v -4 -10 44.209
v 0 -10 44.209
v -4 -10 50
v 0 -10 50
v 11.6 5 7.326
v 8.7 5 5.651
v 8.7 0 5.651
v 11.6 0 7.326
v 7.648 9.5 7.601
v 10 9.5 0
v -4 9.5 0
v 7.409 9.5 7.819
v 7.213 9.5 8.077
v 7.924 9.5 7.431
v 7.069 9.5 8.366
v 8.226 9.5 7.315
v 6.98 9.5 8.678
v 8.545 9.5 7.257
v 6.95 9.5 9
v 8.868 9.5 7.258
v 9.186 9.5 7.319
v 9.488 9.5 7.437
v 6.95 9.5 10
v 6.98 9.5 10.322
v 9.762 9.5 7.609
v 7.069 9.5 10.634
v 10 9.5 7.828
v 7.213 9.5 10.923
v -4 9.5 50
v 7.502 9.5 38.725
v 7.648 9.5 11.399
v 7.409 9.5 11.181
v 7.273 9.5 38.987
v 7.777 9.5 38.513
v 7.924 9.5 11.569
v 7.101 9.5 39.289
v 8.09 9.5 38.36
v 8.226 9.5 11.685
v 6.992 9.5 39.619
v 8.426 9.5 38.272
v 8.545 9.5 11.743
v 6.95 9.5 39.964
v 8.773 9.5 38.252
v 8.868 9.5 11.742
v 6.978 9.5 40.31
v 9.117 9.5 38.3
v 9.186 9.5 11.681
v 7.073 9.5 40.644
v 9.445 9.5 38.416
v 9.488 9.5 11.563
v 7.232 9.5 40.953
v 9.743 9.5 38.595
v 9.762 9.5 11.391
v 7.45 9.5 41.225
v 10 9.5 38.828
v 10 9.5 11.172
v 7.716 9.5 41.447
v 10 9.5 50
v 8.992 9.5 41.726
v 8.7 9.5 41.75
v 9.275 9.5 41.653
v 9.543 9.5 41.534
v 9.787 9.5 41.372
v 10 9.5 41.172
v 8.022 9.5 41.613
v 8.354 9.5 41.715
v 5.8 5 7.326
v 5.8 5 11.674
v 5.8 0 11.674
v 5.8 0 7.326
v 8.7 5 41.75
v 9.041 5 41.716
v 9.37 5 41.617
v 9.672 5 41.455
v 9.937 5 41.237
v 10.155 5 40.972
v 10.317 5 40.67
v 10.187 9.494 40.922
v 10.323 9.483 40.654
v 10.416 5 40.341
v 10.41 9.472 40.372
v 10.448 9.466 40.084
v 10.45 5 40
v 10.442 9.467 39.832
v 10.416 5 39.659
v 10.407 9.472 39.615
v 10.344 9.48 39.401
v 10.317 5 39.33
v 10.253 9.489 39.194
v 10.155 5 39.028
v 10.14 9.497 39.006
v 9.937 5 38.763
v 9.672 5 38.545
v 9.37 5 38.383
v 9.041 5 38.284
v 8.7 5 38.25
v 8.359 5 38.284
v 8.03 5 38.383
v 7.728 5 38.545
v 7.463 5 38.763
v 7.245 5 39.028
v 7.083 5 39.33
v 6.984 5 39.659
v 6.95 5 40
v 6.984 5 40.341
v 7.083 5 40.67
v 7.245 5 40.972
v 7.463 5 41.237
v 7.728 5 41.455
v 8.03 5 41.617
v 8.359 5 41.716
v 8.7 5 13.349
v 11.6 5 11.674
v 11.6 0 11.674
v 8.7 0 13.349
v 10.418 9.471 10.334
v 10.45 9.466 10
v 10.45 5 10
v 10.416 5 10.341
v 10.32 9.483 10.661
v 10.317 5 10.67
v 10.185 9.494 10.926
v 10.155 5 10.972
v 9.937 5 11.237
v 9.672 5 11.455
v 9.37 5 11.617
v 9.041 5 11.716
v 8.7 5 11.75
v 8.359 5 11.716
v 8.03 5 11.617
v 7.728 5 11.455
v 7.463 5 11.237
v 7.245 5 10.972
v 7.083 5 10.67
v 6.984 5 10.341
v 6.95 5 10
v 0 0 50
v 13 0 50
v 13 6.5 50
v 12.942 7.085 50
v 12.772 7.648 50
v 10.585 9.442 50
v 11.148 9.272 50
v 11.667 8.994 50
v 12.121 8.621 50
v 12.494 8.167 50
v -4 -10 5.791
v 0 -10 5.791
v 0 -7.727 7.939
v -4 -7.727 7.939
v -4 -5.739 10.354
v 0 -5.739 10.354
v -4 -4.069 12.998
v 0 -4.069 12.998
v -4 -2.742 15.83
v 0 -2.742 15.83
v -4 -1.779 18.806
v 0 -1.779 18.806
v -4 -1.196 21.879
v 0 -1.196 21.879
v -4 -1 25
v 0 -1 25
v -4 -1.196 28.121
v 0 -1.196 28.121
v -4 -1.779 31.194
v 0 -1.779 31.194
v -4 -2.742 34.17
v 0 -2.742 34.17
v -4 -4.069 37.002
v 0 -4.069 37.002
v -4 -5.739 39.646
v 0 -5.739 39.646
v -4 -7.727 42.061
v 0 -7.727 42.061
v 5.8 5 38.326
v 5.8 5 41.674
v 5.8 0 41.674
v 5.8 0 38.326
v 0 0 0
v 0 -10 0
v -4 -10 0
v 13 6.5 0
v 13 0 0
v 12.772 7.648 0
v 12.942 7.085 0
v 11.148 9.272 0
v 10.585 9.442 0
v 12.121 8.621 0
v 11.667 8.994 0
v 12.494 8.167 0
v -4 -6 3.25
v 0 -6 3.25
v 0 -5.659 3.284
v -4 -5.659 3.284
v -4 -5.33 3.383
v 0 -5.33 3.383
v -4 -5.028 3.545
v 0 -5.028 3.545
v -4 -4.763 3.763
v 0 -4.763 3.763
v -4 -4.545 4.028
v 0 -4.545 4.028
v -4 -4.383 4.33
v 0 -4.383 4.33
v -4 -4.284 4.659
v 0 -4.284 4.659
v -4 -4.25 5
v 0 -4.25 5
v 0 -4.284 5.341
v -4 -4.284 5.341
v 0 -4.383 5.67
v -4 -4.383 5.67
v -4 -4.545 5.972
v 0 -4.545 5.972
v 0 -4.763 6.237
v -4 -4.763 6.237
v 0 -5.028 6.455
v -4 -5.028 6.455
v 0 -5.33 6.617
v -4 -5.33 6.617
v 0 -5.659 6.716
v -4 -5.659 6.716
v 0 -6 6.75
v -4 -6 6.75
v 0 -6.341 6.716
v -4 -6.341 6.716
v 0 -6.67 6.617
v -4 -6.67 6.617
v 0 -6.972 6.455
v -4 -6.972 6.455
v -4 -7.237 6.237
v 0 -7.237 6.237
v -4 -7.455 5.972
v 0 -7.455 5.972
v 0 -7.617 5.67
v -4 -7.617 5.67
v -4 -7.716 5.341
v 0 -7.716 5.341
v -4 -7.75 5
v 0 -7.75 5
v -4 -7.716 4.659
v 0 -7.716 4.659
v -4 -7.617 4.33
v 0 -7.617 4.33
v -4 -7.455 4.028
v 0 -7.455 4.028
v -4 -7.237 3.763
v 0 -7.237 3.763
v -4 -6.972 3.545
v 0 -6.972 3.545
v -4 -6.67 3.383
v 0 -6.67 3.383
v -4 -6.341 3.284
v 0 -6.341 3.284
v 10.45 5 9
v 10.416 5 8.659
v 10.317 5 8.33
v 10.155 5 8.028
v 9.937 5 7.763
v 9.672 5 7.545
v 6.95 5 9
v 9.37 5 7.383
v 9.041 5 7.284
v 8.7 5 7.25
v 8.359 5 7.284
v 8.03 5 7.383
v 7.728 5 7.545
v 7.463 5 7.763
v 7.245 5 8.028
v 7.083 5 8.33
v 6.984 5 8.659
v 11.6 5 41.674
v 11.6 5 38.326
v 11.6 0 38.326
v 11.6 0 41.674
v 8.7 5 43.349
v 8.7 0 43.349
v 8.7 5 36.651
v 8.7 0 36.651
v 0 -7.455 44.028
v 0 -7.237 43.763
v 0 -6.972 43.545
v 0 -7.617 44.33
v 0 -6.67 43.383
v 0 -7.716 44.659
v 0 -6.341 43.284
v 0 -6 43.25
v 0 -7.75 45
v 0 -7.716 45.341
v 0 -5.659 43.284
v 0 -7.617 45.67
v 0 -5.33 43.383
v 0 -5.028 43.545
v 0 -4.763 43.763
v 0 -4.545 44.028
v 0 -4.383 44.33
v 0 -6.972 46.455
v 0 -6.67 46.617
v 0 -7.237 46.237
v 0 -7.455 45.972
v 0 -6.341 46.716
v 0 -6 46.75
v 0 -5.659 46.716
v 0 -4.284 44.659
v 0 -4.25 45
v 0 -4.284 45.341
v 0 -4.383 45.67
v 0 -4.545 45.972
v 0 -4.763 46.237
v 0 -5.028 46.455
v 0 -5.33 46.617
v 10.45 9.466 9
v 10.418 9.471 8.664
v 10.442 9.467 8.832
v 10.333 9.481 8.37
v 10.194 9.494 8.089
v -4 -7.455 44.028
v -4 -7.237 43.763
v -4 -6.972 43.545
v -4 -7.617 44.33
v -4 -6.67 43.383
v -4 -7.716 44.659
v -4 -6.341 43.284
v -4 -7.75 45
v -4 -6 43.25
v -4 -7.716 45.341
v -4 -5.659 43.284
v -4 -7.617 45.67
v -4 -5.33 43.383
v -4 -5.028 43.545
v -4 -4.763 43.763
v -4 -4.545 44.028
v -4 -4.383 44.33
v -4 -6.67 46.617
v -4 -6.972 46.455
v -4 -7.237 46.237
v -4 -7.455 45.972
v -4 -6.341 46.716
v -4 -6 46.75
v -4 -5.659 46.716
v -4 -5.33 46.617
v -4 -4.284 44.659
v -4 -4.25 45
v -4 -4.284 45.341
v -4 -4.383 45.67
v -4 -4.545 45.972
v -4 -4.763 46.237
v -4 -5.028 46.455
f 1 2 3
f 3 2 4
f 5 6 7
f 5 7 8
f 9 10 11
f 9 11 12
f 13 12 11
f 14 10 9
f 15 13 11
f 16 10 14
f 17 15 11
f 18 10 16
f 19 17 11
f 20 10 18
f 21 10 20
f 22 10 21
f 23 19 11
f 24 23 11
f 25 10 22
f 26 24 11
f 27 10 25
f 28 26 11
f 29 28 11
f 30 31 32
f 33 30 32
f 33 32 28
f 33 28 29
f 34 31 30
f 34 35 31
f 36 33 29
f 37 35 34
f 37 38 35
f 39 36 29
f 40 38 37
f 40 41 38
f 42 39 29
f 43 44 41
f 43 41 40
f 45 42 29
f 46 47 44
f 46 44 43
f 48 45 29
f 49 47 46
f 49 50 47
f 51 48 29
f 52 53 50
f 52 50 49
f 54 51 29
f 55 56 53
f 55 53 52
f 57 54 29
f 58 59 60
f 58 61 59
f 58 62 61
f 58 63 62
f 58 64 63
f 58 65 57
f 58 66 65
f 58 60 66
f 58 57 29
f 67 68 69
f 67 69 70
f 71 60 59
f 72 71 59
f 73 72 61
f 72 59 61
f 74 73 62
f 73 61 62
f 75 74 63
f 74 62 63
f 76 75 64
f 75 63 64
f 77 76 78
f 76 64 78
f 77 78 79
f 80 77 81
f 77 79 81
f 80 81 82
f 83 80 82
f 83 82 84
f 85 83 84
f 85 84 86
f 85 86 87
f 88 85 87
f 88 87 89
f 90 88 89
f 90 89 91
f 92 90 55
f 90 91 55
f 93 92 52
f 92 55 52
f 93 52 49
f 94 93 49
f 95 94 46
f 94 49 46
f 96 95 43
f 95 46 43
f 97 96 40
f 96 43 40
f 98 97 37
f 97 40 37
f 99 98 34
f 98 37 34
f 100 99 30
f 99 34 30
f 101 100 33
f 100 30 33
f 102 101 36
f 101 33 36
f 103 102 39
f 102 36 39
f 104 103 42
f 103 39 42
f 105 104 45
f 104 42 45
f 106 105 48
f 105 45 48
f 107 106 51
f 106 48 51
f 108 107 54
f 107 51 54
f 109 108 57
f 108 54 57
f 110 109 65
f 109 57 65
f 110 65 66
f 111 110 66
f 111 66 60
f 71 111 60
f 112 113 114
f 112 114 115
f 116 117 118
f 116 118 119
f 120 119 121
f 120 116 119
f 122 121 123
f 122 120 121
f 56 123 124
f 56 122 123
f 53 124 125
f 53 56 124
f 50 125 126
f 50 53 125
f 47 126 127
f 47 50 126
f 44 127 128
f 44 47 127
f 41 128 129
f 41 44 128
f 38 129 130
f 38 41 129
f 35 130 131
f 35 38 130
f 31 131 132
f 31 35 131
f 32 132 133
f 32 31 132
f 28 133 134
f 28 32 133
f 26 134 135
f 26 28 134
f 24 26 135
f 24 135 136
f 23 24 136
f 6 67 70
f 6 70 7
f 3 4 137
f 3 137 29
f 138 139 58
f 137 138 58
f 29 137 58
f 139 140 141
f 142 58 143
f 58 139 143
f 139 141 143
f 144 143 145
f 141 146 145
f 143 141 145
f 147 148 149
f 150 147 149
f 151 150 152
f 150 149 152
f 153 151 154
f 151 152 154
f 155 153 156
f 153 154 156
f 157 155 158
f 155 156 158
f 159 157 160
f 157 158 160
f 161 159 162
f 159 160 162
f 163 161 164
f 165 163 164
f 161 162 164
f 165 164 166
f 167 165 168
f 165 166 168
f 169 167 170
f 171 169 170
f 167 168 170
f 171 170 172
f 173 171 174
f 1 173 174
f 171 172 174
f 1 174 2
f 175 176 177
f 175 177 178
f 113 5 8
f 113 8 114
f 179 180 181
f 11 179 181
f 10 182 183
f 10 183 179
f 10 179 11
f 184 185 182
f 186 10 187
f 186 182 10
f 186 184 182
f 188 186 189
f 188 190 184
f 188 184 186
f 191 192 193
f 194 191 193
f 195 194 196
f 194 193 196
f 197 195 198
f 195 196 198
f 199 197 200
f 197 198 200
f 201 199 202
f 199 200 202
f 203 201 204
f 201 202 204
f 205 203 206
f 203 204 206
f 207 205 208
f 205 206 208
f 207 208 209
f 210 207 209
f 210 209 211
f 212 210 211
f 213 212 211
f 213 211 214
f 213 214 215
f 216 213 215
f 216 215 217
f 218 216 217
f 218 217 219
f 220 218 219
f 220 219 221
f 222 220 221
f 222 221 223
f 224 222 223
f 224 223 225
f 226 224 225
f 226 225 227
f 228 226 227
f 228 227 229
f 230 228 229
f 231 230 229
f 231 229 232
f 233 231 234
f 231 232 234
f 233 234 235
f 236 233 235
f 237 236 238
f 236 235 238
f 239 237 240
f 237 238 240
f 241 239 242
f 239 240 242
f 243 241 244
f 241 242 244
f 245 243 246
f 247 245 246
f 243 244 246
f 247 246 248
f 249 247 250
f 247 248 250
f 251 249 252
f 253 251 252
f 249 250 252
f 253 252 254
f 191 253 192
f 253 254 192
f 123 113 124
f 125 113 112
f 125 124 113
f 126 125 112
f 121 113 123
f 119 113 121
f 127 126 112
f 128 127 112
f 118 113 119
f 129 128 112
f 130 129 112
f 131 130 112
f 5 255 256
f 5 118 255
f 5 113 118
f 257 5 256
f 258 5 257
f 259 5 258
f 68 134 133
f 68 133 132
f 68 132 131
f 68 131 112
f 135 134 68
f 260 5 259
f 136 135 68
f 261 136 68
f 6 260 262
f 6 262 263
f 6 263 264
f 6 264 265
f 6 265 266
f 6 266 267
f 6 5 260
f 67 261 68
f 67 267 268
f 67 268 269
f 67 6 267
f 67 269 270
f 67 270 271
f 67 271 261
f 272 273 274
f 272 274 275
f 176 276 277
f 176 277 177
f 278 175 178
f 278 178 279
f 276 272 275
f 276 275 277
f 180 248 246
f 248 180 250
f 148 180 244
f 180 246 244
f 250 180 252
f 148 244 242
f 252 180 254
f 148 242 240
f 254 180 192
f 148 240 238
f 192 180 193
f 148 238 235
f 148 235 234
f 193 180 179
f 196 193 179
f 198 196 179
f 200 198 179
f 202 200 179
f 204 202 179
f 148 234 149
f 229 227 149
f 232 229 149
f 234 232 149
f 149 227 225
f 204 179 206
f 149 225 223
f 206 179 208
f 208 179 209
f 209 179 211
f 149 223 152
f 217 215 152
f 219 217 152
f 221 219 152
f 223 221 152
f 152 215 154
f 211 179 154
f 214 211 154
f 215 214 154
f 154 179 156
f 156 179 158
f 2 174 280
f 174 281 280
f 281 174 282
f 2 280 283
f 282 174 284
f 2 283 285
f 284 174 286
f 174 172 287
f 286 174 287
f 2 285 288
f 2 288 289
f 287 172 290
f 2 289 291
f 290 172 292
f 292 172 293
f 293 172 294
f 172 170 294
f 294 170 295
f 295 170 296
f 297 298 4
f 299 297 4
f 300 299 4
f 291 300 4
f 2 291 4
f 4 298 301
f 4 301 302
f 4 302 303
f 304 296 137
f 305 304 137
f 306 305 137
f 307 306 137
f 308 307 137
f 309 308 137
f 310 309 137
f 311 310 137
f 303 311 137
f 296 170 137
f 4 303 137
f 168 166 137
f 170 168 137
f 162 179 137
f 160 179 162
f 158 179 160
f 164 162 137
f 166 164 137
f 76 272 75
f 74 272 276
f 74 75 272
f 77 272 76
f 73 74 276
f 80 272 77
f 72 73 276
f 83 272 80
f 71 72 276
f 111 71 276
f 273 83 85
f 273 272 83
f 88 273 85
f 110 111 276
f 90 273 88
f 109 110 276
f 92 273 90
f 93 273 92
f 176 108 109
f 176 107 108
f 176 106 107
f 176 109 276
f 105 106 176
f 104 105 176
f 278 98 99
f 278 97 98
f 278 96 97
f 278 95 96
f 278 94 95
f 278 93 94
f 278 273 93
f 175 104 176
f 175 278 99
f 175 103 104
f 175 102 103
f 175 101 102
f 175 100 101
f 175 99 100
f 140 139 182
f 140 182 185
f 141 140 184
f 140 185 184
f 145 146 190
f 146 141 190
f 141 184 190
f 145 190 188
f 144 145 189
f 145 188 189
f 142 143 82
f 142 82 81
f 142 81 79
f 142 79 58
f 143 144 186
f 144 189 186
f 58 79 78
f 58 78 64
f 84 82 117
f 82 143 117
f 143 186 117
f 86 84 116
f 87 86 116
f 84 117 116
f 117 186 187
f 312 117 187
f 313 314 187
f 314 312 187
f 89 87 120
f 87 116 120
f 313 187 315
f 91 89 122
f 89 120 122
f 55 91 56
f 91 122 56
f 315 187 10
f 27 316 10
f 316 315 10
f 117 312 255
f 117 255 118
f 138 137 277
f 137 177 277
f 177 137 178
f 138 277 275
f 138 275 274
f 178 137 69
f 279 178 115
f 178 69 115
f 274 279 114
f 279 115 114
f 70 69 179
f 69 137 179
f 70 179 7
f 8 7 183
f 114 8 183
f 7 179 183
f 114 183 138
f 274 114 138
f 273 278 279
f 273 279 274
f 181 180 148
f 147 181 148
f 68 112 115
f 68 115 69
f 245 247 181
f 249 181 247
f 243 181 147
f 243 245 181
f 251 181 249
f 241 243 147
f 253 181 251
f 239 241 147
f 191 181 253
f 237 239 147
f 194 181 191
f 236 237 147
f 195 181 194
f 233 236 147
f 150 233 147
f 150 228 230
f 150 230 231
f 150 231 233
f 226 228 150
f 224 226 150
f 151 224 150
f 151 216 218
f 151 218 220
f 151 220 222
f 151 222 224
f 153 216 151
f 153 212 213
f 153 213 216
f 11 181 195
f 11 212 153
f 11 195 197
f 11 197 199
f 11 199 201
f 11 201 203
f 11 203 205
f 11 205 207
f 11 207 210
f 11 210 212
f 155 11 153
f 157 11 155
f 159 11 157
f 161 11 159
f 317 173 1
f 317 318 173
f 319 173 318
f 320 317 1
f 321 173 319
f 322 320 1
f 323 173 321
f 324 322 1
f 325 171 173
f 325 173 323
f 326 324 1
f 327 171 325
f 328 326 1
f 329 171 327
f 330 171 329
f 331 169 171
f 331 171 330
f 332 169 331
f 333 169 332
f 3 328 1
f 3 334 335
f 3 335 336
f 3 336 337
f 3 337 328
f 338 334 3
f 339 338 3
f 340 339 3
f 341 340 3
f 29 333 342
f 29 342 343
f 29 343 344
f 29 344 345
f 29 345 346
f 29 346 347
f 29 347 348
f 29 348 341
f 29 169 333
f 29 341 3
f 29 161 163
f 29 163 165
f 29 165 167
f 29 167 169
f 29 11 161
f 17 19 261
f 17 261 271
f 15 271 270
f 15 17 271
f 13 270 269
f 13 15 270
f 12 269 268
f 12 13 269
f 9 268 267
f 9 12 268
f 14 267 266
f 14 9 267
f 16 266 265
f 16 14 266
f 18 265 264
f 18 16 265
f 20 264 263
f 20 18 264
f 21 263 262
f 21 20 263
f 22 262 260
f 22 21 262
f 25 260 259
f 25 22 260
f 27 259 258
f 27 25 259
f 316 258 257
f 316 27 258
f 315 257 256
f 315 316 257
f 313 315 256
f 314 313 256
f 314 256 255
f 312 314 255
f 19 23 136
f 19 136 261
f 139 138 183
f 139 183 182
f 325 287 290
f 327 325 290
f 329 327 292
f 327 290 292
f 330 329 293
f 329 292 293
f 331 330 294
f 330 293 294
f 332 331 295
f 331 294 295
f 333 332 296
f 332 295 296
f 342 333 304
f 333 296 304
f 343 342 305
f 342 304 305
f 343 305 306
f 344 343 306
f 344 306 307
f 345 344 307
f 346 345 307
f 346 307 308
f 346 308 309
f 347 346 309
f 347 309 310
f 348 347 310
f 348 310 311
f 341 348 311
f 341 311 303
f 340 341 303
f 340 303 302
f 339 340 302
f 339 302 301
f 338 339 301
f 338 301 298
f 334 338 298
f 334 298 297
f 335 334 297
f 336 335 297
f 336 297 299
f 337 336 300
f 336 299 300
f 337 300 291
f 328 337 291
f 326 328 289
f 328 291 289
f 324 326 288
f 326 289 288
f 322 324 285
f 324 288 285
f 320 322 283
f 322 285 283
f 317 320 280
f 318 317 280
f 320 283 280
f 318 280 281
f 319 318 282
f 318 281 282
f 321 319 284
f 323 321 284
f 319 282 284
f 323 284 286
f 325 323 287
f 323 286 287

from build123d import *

# Parameters (mm, degrees)
ESQUISSE1_W             = 13
ESQUISSE1_H             = 9.5
BOSS_EXTRU_1_DEPTH      = 50
ESQUISSE2_R             = 1.75
ENL_V_MAT_EXTRU_1_DEPTH = 500
ESQUISSE3_W             = 50
ESQUISSE3_H             = 61.5
BOSS_EXTRU_2_DEPTH      = 4
ESQUISSE4_R             = 1.75
ENL_V_MAT_EXTRU_2_DEPTH = 33.5
CONG_2_R                = 3
ENL_V_START             = -5
ESQUISSE5_R             = 1.75
ENL_V_MAT_EXTRU_3_DEPTH = 5


with BuildPart() as part:
    # Esquisse1 → Boss.-Extru.1 (new body)
    with BuildSketch(Plane.XY):
        with Locations((6.5, 4.75)):
            Rectangle(ESQUISSE1_W, ESQUISSE1_H)
    extrude(amount=BOSS_EXTRU_1_DEPTH)

    # Esquisse2 → Enlèv. mat.-Extru.1 (cut)
    with BuildSketch(Plane(origin=(0, 9.5, 0), x_dir=(1, 0, 0), z_dir=(0, 1, 0))):
        with Locations(Location((8.7, -40, 0), (0, 0, 270))):
            Circle(ESQUISSE2_R)
        with BuildLine():
            Line((6.95, -10), (6.95, -9))
            ThreePointArc((6.95, -9), (8.7, -7.25), (10.45, -9))
            Line((10.45, -9), (10.45, -10))
            ThreePointArc((10.45, -10), (8.7, -11.75), (6.95, -10))
        make_face()
    extrude(amount=-ENL_V_MAT_EXTRU_1_DEPTH, mode=Mode.SUBTRACT)

    # Esquisse3 → Boss.-Extru.2 (add)
    with BuildSketch(Plane.ZY):
        with Locations((25, -21.25)):
            Rectangle(ESQUISSE3_W, ESQUISSE3_H)
    extrude(amount=BOSS_EXTRU_2_DEPTH)

    # Esquisse4 → Enlèv. mat.-Extru.2 (cut)
    with BuildSketch(Plane(origin=(0, 0, 0), x_dir=(0, 0, -1), z_dir=(1, 0, 0))):
        with BuildLine():
            Line((-44.209372712, -10), (-50, -10))
            Line((-50, -10), (-50, -52))
            Line((-50, -52), (0, -52))
            Line((0, -52), (0, -10))
            Line((0, -10), (-5.790627288, -10))
            ThreePointArc((-5.790627288, -10), (-25, -1), (-44.209372712, -10))
        make_face()
        with Locations((-45, -6)):
            Circle(ESQUISSE4_R)
        with Locations((-5, -6)):
            Circle(ESQUISSE4_R)
    extrude(amount=-ENL_V_MAT_EXTRU_2_DEPTH, mode=Mode.SUBTRACT)

    # Congé2
    # the kernel refuses this fillet: 3 mm, written as the material it takes off along each edge
    with BuildSketch(Plane(origin=(13, 9.5, -7.5), x_dir=(0, -1, 0), z_dir=(0, 0, 1))) as cong_2_piece_1:
        with BuildLine():
            CenterArc((CONG_2_R, -CONG_2_R), CONG_2_R, 90, 90)
            Line((0, -CONG_2_R), (0, 0))
            Line((0, 0), (CONG_2_R, 0))
        make_face()
    extrude(amount=65, mode=Mode.SUBTRACT)

    # Esquisse5 → Enlèv. mat.-Extru.3 (cut)
    # profile 1 of 4: a face of its own
    with BuildSketch(Plane(origin=(0, 0, 0), x_dir=(-1, 0, 0), z_dir=(0, -1, 0)).offset(ENL_V_START)):
        Polygon((-5.8, -38.325684219), (-8.7, -36.651368439), (-11.6, -38.325684219), (-11.6, -41.674315781), (-8.7, -43.348631561), (-5.8, -41.674315781), align=None)
        with Locations(Location((-8.7, -40, 0), (0, 0, 222.024627579))):
            Circle(ESQUISSE5_R, mode=Mode.SUBTRACT)
    # profile 2 of 4: a face of its own
    with BuildSketch(Plane(origin=(0, 0, 0), x_dir=(-1, 0, 0), z_dir=(0, -1, 0)).offset(ENL_V_START)):
        Polygon((-11.6, -7.325684219), (-11.6, -8.325684219), (-8.7, -6.651368439), (-5.8, -8.325684219), (-5.8, -7.325684219), (-8.7, -5.651368439), align=None)
    # profile 3 of 4: a face of its own
    with BuildSketch(Plane(origin=(0, 0, 0), x_dir=(-1, 0, 0), z_dir=(0, -1, 0)).offset(ENL_V_START)):
        Polygon((-11.6, -10.674315781), (-11.6, -11.674315781), (-8.7, -13.348631561), (-5.8, -11.674315781), (-5.8, -10.674315781), (-8.7, -12.348631561), align=None)
    # profile 4 of 4: a face of its own
    with BuildSketch(Plane(origin=(0, 0, 0), x_dir=(-1, 0, 0), z_dir=(0, -1, 0)).offset(ENL_V_START)):
        Polygon((-11.6, -8.325684219), (-11.6, -10.674315781), (-8.7, -12.348631561), (-5.8, -10.674315781), (-5.8, -8.325684219), (-8.7, -6.651368439), align=None)
        with BuildLine():
            ThreePointArc((-10.45, -9), (-8.7, -7.25), (-6.95, -9))
            Line((-6.95, -9), (-6.95, -10))
            ThreePointArc((-6.95, -10), (-8.7, -11.75), (-10.45, -10))
            Line((-10.45, -10), (-10.45, -9))
        make_face(mode=Mode.SUBTRACT)
    extrude(amount=ENL_V_MAT_EXTRU_3_DEPTH, mode=Mode.SUBTRACT)


solid = part.part
